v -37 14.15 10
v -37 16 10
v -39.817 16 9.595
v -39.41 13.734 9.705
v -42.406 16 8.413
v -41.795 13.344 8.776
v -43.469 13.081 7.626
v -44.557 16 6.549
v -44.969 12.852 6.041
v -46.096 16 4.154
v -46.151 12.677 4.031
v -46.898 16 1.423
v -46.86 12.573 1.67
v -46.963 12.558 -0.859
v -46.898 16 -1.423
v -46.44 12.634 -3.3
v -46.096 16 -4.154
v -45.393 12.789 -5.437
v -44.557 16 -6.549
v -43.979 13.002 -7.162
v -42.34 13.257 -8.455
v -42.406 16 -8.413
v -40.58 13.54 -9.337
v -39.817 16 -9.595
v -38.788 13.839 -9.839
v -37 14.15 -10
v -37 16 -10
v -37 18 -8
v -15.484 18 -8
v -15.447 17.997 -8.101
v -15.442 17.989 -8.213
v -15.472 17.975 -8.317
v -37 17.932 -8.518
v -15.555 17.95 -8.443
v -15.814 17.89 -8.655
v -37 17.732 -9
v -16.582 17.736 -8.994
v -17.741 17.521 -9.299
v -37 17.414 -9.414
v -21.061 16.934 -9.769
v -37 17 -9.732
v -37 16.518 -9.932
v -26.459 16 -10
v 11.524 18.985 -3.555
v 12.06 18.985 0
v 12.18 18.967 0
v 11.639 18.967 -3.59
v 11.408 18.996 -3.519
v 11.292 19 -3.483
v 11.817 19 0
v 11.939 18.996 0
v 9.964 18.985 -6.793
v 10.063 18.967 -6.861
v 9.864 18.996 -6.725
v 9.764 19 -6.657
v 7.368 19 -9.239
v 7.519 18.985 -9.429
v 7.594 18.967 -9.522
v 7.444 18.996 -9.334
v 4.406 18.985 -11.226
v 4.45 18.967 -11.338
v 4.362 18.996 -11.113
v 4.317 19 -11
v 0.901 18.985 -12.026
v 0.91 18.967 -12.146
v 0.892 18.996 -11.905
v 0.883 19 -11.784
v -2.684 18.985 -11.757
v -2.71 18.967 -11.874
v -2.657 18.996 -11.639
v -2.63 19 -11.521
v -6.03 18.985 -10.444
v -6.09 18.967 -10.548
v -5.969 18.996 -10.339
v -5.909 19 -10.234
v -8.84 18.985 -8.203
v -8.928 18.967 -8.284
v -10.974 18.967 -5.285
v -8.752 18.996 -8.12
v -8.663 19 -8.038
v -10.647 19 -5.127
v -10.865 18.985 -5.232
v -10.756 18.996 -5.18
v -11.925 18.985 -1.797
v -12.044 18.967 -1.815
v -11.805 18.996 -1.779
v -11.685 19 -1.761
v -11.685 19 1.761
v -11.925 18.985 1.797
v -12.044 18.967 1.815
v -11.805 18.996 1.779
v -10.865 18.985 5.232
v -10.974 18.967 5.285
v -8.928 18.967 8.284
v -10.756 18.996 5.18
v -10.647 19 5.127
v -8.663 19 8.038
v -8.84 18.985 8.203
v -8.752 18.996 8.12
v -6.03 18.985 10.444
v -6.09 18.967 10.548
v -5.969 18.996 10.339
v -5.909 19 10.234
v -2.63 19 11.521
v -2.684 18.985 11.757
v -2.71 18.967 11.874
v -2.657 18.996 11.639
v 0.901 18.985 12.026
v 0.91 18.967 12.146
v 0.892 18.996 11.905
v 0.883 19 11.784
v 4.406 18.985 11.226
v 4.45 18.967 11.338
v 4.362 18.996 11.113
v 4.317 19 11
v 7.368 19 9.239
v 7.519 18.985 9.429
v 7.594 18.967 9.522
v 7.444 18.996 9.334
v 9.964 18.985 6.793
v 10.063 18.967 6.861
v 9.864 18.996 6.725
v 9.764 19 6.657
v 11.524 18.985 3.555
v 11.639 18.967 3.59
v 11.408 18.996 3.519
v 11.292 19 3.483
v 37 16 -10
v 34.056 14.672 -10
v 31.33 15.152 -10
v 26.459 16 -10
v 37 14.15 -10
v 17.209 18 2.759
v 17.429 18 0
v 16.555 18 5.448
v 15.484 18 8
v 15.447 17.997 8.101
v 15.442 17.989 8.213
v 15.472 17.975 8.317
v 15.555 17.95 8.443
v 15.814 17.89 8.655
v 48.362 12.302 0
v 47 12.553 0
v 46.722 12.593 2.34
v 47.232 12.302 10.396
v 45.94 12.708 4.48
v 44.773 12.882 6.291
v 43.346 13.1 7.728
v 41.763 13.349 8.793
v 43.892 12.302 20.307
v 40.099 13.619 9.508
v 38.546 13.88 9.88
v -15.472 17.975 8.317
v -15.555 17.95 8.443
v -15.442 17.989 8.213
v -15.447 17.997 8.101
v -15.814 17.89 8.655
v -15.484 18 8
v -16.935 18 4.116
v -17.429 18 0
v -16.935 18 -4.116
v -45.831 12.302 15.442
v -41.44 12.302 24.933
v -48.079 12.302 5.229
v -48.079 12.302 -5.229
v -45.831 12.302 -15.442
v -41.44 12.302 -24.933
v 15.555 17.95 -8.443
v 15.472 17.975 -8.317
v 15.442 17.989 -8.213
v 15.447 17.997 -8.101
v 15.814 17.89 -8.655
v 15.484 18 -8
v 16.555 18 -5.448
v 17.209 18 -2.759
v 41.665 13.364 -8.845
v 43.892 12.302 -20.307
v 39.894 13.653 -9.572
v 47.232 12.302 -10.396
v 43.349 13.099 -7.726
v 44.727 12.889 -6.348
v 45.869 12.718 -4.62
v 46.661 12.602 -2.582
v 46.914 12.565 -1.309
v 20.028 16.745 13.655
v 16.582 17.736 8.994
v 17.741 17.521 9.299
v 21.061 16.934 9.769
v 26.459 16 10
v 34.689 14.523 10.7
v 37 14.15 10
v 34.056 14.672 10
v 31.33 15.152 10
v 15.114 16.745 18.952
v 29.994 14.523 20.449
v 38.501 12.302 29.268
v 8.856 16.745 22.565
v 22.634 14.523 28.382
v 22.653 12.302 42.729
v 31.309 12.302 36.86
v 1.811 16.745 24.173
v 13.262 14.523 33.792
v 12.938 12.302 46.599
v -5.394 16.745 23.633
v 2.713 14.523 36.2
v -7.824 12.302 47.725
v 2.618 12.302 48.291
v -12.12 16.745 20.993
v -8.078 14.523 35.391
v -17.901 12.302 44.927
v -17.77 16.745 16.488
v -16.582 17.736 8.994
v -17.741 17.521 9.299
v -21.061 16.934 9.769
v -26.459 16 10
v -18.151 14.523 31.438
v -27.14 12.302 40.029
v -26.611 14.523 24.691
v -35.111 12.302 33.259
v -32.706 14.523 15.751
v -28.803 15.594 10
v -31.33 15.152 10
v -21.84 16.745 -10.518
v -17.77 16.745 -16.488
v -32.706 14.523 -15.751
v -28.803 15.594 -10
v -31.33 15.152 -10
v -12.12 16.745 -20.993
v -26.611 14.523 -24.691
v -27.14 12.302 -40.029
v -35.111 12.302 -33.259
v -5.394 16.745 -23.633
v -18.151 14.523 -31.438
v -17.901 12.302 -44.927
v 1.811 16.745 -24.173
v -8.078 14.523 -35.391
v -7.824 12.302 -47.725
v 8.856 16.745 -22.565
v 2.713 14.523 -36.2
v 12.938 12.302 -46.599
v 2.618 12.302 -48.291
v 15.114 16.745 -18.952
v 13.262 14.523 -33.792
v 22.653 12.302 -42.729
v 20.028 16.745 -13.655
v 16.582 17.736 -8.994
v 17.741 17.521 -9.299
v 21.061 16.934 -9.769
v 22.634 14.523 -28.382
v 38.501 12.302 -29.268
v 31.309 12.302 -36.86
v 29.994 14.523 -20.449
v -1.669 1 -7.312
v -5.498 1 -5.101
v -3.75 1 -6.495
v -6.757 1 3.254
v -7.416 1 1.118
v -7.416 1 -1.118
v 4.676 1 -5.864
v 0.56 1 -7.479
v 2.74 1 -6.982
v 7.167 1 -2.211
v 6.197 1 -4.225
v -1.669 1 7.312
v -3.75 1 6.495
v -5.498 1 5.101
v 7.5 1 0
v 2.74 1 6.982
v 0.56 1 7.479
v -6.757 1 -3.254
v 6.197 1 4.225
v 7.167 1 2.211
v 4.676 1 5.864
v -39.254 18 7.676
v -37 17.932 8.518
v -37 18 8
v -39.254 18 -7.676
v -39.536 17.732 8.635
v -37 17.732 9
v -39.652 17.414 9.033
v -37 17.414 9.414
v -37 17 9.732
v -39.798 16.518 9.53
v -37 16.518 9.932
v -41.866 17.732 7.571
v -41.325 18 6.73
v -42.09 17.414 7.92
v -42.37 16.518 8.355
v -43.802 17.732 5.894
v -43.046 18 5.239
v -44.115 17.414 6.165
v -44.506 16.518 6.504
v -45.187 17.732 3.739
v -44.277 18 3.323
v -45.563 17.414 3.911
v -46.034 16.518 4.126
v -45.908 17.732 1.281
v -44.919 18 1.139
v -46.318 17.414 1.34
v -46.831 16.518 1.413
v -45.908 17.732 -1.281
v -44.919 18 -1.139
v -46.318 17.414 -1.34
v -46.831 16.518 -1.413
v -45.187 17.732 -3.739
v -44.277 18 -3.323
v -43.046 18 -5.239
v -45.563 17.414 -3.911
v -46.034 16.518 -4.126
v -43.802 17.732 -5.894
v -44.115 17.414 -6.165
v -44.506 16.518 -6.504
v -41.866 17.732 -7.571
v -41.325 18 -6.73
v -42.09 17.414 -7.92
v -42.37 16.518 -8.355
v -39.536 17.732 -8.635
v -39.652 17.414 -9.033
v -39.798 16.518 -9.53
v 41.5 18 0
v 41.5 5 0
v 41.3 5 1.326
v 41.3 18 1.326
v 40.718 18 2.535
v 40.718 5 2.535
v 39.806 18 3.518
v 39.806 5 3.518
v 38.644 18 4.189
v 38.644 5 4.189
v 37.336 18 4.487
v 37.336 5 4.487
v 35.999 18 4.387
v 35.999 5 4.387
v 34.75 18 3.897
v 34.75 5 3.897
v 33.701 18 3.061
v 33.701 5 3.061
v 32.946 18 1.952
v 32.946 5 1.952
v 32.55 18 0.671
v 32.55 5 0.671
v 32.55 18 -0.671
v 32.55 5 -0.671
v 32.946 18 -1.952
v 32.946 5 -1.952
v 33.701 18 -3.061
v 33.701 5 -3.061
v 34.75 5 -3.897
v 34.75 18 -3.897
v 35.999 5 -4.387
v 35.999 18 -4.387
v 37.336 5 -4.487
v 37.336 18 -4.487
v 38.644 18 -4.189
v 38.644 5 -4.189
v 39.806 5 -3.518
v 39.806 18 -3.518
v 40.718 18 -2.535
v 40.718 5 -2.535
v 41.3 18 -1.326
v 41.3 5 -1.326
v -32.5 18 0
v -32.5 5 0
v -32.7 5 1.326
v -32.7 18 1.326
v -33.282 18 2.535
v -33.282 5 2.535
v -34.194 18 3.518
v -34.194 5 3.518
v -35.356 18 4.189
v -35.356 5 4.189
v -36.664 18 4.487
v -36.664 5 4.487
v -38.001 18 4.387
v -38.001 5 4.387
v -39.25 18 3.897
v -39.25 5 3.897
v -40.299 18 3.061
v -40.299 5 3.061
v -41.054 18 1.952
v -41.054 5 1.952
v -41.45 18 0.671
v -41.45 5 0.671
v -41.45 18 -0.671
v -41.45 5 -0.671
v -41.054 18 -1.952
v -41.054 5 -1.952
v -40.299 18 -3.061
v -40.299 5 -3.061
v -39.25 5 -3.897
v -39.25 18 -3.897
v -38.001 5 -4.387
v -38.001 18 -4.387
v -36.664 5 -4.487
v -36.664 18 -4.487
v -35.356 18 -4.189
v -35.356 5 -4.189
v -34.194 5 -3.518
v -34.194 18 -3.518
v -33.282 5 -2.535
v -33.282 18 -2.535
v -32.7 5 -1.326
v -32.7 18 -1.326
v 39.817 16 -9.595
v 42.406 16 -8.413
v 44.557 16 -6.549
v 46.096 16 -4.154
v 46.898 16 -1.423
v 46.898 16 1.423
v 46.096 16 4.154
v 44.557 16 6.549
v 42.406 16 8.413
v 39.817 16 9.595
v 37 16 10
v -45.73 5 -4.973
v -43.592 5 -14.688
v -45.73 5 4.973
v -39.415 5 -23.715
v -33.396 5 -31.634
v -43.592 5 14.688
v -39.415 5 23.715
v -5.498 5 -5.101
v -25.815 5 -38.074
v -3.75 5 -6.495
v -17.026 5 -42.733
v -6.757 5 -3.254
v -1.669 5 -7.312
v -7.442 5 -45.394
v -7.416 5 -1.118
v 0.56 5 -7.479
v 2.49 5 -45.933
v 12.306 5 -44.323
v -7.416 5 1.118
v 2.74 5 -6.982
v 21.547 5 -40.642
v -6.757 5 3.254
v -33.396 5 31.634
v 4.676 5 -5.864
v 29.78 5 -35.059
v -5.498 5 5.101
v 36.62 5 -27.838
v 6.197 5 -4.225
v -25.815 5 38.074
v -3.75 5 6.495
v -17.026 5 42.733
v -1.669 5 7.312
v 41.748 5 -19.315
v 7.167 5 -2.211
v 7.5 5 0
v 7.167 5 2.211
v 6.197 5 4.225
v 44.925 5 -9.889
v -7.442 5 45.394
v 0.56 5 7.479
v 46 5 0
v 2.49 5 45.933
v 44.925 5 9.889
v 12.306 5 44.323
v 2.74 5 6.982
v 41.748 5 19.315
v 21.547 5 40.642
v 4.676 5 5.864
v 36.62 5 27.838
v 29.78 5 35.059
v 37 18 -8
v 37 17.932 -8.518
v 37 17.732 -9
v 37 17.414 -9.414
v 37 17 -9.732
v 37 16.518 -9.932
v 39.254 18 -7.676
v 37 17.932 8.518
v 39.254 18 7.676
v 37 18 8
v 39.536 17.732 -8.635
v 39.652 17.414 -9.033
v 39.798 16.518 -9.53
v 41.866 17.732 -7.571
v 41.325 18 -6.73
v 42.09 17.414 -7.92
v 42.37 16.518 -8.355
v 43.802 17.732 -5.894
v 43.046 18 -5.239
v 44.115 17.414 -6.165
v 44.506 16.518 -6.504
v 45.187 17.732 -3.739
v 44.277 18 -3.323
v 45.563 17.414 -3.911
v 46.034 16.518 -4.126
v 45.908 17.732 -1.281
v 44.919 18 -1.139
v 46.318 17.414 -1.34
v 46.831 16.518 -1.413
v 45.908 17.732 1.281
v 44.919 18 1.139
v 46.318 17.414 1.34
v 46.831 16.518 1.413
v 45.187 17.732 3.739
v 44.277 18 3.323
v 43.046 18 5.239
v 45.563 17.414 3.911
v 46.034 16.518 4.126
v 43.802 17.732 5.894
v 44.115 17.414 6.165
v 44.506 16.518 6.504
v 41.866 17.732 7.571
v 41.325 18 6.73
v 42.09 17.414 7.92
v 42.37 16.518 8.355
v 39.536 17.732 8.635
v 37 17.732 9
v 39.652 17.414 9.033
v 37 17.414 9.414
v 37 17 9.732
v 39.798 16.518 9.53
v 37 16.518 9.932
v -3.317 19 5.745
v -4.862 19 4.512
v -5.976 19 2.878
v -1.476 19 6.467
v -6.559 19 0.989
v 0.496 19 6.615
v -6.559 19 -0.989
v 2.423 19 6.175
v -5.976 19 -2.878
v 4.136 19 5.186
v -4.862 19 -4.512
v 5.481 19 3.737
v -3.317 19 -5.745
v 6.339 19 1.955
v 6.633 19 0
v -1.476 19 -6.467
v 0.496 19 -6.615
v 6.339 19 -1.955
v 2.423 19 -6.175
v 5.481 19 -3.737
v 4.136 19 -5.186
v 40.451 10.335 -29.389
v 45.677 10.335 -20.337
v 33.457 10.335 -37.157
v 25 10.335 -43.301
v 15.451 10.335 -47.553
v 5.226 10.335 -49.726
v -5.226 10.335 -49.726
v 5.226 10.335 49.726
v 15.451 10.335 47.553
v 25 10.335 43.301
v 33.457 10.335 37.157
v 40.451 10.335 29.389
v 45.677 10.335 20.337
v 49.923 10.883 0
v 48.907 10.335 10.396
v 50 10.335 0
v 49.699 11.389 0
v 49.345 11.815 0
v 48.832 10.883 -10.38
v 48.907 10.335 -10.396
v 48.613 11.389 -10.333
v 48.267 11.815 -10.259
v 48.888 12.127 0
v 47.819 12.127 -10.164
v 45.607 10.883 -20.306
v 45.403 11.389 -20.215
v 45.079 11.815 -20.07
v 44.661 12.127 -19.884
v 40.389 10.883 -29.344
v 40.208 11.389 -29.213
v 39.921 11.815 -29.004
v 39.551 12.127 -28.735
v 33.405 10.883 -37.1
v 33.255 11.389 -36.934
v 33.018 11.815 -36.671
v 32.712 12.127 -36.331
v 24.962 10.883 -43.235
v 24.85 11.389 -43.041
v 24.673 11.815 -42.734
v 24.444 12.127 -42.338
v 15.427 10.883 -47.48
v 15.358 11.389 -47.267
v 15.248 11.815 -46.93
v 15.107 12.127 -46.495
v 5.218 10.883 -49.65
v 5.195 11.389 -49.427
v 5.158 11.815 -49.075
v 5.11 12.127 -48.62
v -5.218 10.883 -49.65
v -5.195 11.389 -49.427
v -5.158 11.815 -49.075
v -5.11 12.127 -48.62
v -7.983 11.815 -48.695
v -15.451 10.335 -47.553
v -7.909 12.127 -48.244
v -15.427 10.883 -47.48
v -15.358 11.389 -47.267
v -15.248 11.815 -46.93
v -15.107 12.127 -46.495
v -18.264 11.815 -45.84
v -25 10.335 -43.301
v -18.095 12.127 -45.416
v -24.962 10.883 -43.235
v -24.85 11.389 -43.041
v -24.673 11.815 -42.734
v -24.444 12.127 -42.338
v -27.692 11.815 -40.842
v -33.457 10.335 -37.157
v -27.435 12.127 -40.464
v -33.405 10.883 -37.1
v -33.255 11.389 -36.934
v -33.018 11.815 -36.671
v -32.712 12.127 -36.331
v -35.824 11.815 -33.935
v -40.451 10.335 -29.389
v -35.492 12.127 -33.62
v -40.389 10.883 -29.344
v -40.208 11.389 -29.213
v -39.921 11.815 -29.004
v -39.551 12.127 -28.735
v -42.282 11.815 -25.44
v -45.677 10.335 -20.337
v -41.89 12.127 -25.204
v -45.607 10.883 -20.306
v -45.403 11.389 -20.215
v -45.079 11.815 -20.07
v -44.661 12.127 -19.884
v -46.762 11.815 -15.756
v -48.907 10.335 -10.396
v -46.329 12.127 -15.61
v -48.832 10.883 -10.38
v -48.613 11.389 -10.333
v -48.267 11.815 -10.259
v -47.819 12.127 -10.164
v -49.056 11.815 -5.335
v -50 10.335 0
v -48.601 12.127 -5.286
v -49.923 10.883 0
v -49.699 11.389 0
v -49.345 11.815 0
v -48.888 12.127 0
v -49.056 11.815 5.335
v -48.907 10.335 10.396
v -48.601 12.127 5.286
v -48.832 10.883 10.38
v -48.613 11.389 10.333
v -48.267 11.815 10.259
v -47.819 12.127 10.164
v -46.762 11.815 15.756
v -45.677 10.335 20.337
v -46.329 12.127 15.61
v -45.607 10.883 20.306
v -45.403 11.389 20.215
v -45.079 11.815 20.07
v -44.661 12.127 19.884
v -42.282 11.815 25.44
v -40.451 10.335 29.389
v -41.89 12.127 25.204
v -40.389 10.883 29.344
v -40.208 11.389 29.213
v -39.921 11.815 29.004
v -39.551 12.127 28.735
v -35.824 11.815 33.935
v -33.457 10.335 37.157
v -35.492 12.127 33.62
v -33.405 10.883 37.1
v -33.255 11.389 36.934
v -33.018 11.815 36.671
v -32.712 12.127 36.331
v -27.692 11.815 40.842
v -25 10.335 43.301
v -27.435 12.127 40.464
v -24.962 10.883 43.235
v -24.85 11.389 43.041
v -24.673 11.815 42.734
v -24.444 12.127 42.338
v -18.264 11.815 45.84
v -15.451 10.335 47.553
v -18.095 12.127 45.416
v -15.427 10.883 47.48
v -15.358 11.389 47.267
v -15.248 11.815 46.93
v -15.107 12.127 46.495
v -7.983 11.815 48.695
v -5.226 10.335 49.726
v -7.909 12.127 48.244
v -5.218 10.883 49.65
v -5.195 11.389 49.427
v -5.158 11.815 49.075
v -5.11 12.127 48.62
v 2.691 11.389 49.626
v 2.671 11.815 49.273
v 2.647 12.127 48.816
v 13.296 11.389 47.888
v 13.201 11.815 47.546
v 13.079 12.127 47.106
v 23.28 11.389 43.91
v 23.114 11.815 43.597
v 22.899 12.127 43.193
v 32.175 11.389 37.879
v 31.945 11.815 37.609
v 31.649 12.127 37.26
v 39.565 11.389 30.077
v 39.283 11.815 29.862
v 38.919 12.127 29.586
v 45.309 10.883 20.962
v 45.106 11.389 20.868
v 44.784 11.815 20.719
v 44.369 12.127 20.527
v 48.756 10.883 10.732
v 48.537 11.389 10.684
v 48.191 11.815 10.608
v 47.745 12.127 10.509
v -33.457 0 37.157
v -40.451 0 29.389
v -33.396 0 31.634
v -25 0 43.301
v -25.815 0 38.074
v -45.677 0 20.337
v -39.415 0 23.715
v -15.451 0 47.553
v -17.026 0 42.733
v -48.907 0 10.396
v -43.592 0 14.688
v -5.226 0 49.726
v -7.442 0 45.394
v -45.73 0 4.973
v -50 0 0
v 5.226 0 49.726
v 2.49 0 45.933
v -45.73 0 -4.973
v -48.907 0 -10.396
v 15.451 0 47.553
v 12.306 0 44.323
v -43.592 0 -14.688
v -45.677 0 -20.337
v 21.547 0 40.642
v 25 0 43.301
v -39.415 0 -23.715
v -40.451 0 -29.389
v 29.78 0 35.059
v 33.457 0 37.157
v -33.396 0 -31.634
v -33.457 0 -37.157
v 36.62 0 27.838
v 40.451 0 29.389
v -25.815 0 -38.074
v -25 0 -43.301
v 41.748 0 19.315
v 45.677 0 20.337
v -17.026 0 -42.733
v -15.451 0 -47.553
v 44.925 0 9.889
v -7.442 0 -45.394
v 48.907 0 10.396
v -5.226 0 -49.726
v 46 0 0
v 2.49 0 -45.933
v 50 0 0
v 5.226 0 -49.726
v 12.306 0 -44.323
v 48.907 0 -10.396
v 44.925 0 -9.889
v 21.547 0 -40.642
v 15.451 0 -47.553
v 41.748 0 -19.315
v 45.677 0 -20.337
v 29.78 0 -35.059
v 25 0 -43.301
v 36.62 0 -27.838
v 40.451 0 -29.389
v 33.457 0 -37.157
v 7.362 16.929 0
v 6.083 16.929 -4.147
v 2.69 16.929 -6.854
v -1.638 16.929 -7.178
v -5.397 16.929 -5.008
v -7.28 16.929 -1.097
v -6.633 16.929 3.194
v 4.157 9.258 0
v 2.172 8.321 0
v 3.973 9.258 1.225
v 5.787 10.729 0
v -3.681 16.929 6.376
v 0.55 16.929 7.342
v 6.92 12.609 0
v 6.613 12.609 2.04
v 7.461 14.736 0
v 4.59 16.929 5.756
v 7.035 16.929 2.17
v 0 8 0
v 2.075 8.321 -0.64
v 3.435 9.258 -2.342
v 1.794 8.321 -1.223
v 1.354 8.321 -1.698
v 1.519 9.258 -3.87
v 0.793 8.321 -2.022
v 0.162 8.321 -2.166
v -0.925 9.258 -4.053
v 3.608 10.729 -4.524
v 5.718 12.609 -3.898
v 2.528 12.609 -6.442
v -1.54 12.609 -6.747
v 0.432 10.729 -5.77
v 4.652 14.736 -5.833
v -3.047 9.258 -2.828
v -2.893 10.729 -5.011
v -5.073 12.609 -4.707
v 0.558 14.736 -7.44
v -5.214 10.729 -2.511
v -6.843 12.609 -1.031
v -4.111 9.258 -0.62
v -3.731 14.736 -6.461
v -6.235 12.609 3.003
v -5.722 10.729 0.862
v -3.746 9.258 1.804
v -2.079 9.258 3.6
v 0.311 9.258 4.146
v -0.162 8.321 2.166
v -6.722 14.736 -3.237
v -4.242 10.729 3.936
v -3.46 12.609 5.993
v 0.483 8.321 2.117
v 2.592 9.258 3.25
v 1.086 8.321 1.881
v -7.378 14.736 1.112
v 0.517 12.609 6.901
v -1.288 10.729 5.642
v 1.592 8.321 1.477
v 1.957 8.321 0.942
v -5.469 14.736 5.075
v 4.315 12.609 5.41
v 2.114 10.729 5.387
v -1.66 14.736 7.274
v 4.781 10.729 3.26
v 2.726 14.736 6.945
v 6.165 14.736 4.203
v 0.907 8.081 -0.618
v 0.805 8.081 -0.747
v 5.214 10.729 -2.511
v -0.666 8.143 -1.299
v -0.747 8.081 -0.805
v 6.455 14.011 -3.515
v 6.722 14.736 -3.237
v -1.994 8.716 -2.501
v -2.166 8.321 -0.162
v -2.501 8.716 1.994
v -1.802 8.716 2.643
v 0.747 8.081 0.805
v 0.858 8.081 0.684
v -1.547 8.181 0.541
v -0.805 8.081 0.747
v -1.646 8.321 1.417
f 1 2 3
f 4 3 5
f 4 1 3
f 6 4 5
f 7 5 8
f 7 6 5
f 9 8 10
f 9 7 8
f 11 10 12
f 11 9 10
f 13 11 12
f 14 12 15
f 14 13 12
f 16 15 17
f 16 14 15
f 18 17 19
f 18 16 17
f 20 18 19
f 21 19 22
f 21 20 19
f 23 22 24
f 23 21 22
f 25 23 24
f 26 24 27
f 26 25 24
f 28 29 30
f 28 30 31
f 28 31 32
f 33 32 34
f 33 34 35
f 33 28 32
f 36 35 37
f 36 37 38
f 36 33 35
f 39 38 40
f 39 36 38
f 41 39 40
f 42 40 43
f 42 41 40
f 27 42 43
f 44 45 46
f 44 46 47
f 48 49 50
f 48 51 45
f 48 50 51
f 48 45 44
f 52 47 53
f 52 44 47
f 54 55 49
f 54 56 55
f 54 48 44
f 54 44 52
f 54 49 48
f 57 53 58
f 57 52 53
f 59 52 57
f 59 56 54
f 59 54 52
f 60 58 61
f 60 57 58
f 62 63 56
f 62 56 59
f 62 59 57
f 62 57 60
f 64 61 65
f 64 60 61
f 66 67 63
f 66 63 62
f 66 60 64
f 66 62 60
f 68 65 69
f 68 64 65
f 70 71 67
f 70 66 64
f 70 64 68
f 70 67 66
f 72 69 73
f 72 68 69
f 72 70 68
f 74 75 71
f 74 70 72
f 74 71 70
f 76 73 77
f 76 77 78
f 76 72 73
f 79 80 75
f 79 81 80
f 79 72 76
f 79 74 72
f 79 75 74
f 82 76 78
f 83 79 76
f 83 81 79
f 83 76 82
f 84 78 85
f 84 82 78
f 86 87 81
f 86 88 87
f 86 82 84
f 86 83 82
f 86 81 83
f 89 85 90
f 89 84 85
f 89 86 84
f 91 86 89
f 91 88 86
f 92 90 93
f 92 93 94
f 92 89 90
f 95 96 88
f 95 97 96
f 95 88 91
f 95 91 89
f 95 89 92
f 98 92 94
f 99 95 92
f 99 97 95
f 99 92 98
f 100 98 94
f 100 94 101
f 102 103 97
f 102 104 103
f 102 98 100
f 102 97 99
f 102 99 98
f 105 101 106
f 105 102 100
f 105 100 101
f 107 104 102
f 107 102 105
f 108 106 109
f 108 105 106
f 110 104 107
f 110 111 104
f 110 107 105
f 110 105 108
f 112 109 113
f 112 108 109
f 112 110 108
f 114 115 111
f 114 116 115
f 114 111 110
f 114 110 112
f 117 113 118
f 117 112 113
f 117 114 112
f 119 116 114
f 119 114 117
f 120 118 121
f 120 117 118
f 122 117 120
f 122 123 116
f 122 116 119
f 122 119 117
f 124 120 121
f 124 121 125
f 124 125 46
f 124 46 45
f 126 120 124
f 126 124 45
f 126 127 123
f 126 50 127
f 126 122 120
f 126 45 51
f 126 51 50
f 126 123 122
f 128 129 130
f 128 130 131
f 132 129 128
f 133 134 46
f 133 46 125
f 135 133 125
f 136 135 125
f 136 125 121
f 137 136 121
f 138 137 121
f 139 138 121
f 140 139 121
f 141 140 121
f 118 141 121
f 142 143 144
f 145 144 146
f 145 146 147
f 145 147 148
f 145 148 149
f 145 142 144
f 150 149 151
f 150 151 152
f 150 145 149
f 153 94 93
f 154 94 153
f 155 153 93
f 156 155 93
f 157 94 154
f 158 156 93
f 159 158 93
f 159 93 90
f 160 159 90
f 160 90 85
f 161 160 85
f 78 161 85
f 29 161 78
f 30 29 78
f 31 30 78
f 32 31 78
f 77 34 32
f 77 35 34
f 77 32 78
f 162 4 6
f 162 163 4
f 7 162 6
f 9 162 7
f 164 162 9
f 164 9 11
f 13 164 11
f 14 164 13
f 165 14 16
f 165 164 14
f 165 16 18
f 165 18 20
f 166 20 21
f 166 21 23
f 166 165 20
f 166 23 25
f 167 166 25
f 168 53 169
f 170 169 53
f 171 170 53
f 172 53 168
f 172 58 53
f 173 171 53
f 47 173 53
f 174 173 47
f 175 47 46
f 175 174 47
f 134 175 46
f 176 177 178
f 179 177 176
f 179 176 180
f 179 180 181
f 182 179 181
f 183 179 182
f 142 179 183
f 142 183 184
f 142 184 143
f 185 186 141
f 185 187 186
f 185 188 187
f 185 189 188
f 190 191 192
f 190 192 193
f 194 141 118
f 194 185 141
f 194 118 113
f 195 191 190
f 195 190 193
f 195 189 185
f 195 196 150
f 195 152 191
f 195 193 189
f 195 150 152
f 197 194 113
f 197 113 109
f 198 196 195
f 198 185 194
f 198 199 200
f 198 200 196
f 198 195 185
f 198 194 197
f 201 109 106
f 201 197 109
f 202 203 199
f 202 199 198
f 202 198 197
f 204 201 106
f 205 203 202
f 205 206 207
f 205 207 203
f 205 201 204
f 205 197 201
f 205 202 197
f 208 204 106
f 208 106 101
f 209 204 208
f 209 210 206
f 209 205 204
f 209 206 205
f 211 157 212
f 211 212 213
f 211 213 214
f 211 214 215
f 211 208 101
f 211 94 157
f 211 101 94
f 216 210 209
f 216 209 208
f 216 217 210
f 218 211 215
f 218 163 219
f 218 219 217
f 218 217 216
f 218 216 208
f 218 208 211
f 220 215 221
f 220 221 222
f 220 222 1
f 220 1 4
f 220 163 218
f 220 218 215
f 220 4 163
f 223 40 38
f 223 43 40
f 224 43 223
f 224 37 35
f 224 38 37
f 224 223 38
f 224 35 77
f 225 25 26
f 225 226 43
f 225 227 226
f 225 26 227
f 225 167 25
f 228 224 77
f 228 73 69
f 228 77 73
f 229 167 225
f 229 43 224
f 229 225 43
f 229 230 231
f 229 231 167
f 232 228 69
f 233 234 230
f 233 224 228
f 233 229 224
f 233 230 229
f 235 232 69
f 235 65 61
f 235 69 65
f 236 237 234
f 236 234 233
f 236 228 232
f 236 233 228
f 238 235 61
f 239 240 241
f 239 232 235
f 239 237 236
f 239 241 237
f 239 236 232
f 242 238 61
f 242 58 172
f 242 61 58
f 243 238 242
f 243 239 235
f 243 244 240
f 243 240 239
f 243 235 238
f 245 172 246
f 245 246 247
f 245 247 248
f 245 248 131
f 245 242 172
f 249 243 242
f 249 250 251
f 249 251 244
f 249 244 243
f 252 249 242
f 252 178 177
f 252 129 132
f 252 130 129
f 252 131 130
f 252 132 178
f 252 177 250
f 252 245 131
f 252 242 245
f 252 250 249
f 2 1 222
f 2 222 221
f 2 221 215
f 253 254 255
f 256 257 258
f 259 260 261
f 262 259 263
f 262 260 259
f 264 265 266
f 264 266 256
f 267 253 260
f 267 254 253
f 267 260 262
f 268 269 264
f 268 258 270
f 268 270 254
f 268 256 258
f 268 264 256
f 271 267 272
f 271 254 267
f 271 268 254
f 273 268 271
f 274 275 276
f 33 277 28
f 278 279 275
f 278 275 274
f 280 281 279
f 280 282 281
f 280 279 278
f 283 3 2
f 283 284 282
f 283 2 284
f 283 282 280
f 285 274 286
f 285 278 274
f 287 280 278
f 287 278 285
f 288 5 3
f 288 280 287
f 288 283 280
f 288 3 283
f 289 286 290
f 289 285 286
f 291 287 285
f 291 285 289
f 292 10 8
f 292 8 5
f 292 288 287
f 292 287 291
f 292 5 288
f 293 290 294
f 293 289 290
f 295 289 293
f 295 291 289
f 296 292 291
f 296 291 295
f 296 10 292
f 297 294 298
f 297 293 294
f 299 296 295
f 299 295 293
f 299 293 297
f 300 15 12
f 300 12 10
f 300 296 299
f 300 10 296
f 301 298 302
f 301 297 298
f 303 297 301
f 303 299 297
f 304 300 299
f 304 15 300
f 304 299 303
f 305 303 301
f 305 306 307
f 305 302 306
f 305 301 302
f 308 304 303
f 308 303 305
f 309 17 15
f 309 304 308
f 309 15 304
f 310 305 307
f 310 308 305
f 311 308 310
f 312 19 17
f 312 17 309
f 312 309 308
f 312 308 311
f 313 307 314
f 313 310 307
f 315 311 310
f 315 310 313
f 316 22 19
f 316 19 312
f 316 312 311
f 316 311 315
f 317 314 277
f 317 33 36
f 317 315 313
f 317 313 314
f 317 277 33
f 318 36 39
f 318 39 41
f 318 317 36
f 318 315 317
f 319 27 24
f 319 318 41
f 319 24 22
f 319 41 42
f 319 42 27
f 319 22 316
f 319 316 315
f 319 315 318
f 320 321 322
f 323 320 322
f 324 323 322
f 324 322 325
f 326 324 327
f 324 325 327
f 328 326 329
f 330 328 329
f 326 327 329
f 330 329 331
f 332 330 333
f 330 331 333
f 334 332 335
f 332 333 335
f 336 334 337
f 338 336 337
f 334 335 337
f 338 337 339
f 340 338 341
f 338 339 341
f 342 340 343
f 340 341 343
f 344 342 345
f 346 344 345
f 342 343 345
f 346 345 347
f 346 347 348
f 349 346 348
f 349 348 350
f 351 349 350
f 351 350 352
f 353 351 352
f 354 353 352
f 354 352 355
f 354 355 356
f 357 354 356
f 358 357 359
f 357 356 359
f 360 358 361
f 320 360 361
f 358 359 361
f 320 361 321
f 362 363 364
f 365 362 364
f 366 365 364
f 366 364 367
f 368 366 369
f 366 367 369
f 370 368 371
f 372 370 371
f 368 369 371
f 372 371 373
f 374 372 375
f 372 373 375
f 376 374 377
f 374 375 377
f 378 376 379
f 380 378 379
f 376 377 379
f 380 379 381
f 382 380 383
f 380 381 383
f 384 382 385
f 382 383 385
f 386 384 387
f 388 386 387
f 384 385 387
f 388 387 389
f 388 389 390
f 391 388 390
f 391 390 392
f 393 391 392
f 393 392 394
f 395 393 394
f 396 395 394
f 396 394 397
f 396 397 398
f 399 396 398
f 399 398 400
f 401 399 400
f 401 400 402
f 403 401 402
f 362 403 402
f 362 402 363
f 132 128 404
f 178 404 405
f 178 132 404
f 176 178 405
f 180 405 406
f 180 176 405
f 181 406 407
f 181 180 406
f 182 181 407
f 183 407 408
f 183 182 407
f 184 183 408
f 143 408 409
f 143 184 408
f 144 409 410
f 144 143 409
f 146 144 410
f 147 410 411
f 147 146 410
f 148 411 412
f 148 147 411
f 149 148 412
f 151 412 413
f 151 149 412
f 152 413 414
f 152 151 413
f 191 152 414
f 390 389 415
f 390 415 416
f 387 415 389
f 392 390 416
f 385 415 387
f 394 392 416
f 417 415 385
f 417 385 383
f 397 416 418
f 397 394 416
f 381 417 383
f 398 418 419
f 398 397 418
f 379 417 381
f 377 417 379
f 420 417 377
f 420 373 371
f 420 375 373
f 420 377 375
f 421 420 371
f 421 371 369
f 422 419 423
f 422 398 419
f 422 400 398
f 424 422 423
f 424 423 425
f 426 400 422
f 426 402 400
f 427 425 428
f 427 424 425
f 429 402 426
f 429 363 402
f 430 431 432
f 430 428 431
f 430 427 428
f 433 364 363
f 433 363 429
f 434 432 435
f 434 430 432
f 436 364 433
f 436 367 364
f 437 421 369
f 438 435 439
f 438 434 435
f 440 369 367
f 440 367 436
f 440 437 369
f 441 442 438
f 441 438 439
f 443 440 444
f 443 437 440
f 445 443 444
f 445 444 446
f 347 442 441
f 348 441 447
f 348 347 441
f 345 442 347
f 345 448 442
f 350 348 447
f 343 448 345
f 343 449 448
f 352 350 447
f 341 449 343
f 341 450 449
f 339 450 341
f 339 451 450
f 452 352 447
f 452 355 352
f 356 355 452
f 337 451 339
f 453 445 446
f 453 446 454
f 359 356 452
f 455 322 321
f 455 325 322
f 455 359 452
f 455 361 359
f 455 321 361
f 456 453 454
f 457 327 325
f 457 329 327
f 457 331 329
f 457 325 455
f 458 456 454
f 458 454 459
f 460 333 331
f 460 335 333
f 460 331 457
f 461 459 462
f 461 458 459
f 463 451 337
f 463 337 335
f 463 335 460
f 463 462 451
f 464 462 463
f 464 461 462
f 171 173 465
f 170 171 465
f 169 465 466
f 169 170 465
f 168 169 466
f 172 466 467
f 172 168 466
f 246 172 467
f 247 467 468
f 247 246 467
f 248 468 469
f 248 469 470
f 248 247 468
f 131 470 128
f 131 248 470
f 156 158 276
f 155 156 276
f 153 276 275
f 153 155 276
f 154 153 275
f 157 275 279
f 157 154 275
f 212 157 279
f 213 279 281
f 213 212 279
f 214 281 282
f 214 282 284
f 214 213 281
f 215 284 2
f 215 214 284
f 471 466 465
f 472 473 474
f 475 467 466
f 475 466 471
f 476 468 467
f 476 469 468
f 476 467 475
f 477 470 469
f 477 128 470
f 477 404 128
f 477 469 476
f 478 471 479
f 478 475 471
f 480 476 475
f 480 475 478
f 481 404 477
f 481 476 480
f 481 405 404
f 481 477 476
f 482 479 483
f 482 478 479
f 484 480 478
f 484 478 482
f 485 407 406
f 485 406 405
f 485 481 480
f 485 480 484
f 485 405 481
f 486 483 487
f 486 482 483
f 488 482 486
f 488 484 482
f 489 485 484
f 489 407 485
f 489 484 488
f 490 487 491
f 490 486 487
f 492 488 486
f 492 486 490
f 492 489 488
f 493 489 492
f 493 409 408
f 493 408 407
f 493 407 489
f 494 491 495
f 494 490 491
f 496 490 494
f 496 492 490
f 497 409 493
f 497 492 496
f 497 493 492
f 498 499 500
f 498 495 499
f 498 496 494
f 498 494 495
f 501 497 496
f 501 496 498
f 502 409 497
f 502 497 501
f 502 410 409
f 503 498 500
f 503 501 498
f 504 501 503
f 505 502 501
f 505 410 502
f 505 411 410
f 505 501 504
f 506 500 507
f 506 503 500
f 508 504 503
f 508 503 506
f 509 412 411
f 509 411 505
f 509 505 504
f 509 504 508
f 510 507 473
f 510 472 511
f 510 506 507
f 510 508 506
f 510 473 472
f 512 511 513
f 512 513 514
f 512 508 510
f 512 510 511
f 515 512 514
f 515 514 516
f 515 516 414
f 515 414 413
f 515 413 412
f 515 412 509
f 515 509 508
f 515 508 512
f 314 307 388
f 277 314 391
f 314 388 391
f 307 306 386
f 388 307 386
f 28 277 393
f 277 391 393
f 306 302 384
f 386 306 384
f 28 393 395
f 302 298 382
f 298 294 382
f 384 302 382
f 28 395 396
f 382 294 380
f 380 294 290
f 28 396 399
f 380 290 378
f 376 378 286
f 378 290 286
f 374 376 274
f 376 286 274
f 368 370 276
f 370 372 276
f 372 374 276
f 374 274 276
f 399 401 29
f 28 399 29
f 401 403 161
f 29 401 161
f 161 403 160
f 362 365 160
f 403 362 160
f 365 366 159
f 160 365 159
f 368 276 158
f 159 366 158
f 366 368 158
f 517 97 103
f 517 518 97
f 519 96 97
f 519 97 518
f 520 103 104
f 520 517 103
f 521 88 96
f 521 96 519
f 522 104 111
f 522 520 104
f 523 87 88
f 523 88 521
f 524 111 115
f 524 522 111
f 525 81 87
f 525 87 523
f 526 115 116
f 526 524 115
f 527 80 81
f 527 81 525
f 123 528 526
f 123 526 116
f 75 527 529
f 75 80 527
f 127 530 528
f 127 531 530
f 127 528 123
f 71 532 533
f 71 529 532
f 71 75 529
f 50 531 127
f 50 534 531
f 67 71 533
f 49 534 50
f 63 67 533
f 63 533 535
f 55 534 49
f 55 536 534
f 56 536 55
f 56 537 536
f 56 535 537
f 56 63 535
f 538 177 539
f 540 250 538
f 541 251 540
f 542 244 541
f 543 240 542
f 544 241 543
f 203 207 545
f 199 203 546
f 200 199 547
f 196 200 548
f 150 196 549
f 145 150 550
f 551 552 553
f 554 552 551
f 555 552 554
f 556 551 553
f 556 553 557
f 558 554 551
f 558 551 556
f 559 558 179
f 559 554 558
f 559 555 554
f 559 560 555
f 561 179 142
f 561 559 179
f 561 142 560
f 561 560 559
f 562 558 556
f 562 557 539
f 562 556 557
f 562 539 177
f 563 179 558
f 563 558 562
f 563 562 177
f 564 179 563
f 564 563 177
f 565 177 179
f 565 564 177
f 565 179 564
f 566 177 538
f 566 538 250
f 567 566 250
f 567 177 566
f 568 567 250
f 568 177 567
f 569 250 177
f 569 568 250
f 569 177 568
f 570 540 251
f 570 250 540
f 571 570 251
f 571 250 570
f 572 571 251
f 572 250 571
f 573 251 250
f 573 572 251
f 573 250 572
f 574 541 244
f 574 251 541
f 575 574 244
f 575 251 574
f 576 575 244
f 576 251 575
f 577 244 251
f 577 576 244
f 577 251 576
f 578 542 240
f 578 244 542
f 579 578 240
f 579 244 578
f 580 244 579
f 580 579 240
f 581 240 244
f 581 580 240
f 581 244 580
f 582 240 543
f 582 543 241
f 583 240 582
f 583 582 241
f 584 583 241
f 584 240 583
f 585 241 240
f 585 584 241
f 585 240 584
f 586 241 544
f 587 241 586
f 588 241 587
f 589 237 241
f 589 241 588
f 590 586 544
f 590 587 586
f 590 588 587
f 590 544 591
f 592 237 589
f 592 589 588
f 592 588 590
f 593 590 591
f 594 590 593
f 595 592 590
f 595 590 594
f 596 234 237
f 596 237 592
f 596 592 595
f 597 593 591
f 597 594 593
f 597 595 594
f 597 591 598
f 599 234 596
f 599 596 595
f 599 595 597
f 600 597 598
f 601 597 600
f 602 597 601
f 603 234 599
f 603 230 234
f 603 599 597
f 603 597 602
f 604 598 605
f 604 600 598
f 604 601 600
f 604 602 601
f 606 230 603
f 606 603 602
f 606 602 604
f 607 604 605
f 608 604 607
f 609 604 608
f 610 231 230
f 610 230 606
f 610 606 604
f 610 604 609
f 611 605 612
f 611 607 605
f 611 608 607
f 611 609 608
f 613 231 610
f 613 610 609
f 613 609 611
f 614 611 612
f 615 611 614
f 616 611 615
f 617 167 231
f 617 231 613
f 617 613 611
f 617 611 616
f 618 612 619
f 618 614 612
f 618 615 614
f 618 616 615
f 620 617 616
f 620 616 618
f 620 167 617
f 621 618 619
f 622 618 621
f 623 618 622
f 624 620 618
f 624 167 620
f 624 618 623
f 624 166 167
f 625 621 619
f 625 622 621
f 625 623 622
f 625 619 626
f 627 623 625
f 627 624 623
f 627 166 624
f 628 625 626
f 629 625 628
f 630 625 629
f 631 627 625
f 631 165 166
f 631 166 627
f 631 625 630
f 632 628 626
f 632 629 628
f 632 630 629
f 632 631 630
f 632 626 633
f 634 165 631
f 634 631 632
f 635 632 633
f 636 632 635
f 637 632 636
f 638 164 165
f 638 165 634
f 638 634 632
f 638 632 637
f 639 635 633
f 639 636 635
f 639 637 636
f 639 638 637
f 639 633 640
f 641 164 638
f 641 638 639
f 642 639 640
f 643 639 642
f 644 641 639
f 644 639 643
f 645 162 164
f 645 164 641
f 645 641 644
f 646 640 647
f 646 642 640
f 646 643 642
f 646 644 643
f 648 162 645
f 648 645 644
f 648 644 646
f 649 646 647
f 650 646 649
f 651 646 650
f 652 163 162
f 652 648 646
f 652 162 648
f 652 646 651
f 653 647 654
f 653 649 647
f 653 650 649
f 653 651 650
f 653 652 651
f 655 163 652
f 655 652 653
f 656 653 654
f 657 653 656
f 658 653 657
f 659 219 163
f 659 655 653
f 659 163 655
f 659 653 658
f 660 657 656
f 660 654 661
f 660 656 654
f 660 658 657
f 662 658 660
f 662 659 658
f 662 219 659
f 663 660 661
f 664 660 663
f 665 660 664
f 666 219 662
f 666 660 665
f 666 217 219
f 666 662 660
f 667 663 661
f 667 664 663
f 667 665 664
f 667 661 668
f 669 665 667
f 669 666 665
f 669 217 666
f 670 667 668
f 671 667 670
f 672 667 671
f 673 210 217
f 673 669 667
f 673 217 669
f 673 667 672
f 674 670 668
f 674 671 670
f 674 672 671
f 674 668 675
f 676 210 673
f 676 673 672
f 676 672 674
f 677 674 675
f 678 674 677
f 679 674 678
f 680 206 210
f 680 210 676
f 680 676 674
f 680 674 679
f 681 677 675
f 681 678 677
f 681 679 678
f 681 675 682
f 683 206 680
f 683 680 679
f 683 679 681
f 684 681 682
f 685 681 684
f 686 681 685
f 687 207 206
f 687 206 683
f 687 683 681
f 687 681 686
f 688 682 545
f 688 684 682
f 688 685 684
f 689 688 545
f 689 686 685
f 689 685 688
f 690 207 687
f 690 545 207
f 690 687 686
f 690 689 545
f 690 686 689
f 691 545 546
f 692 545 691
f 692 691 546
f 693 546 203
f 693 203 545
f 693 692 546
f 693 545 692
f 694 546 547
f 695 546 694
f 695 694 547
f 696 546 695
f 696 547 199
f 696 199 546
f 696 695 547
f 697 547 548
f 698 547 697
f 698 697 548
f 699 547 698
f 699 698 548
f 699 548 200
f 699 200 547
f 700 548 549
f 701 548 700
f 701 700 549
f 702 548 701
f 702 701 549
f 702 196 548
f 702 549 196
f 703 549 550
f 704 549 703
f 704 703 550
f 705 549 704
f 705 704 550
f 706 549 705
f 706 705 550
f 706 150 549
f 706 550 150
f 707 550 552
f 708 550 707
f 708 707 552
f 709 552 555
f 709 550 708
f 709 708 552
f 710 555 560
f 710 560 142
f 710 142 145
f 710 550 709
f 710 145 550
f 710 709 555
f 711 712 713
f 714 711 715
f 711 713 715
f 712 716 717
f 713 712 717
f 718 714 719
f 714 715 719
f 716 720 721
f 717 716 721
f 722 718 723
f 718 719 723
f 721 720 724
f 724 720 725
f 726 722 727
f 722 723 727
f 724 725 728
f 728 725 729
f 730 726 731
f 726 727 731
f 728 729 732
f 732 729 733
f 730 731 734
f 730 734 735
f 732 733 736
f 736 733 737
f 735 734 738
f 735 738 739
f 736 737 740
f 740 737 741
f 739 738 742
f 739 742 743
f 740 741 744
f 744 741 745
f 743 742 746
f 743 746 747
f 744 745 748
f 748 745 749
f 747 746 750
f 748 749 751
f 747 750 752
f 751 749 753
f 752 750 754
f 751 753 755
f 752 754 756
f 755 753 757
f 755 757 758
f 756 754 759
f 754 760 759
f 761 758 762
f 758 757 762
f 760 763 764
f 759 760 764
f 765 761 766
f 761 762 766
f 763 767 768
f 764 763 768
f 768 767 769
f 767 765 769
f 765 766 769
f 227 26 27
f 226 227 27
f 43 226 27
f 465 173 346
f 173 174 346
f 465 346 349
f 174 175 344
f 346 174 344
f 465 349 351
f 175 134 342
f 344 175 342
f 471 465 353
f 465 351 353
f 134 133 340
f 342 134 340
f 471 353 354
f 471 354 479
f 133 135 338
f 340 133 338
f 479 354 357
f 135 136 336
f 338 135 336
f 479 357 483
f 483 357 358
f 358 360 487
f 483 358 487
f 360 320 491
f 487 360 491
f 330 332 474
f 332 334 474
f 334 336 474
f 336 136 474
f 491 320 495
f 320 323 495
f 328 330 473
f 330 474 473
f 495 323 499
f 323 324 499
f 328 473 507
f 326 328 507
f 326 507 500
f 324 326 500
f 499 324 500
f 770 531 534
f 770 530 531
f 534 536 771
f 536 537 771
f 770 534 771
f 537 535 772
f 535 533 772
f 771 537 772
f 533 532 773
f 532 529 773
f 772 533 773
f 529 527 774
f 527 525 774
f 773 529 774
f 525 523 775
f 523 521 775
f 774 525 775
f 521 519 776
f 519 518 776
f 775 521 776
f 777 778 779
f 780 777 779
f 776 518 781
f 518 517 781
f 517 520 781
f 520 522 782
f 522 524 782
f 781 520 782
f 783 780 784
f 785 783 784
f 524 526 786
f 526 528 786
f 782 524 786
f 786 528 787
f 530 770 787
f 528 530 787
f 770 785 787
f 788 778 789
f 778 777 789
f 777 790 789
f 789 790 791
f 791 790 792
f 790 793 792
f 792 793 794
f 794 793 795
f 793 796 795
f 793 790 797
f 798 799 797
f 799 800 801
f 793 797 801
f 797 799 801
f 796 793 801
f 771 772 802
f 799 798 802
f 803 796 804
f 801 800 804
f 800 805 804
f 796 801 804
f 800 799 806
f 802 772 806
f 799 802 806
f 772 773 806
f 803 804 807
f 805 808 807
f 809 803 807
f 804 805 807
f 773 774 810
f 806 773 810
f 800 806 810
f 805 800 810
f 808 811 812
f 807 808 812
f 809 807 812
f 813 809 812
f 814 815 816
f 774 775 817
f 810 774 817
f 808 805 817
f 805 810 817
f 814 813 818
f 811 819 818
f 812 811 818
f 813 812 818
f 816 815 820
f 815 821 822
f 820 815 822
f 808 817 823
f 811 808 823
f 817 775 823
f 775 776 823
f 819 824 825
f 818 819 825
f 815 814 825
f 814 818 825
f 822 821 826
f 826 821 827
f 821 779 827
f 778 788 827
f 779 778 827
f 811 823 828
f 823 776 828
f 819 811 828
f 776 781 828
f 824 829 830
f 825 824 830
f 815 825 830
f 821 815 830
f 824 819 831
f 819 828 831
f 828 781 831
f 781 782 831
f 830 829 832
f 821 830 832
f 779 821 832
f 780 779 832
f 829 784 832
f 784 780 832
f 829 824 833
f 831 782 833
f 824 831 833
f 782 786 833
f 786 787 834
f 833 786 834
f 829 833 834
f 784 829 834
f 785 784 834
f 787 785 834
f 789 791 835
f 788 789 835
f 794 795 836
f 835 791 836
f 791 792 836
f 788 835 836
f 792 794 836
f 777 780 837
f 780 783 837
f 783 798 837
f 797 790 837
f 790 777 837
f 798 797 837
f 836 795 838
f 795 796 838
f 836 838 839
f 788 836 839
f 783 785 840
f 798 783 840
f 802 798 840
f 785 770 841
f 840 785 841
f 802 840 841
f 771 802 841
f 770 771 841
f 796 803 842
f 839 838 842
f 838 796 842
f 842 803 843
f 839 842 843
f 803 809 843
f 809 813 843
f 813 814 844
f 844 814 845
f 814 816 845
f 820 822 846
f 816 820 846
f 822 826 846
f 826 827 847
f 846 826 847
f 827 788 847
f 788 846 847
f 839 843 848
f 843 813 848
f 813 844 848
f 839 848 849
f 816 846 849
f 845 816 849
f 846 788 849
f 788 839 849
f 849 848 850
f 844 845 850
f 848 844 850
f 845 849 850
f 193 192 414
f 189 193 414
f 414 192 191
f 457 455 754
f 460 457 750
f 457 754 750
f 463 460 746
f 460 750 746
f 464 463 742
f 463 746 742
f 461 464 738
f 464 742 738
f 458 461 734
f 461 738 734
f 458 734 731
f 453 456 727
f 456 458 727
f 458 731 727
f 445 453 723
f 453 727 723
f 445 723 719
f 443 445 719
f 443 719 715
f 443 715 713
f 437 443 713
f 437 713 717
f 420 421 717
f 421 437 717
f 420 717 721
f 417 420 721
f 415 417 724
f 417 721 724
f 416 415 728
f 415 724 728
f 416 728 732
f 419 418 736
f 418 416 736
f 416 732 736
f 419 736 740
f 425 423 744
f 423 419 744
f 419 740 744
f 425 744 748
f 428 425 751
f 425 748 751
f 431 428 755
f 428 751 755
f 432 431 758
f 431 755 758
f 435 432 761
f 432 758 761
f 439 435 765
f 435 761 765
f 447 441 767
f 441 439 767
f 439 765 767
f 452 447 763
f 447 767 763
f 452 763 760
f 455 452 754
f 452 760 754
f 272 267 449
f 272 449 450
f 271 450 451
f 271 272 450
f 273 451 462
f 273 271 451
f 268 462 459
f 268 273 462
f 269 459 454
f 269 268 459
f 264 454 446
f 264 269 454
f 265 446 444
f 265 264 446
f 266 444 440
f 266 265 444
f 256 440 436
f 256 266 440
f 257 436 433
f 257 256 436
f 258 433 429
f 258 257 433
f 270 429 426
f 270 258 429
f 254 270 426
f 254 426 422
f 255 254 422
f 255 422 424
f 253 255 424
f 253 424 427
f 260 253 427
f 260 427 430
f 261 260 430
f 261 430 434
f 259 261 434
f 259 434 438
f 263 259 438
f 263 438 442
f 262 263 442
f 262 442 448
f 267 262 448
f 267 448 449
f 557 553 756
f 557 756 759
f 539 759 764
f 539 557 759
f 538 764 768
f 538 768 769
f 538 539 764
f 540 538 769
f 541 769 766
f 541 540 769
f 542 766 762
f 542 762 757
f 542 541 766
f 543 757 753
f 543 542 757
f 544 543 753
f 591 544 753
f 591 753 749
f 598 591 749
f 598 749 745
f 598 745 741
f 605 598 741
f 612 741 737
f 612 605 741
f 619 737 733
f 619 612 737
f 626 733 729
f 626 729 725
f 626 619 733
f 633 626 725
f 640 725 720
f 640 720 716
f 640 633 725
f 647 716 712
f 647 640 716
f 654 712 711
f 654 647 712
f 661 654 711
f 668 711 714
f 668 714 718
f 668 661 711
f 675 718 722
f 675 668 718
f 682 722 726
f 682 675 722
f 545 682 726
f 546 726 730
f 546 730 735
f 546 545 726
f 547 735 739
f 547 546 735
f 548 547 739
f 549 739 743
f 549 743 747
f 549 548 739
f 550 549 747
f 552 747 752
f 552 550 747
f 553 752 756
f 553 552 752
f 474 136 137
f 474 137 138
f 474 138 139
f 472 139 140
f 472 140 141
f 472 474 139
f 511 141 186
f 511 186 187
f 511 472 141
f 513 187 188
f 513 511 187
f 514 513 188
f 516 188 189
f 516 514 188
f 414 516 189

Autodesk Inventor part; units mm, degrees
ref_plane "YZ Plane" through (0, 0, 0) normal (1, 0, 0) x (0, 1, 0)
ref_plane "XZ Plane" through (0, 0, 0) normal (0, 1, 0) x (-1, 0, 0)
ref_plane "XY Plane" through (0, 0, 0) normal (0, 0, 1) x (1, 0, 0)
sketch "Sketch1" plane through (0, 0, 0) normal (0, 0, 1) x (1, 0, 0)
  line L0 (0, 0) -> (50, 0)
  line L1 (50, 0) -> (50, 10.3348)
  line L2 (0, 0) -> (0, 19) construction
  arc A0 (0, 8) -> (6.6332, 19) centre (0, 15.5) ccw
  line L3 (6.6332, 19) -> (11.8173, 19)
  line L4 (48.3623, 12.3017) -> (12.1797, 18.9669)
  arc A1 (12.1797, 18.9669) -> (11.8173, 19) centre (11.8173, 17) ccw
  arc A2 (50, 10.3348) -> (48.3623, 12.3017) centre (48, 10.3348) ccw
  line L5 (0, 0) -> (0, 8)
  point P0 (50, 12)
  point P1 (12, 19)
  dimension "d0" = 50
  dimension "d1" = 12
  dimension "d2" = 19
  dimension "d3" = 15
  dimension "d4" = 3.5
  dimension "d5" = 12
  dimension "d6" = 2
  dimension "d14" = 19
revolve "Revolution1" add sketch "Sketch1" angle 360 about axis through (0, 0, 0) along (0, 1, 0)
sketch "Sketch2" plane through (0, 0, 0) normal (0, -1, 0) x (1, 0, 0)
  circle A0 centre (0, 0) radius 50 projected
  circle A1 centre (0, 0) radius 7.5
  dimension "d8" = 15
extrude "Extrusion1" cut sketch "Sketch2" against normal blind 1 contours A1
sketch "Sketch3" plane through (0, 0, 0) normal (0, -1, 0) x (1, 0, 0)
  circle A0 centre (0, 0) radius 7.5 projected
  circle A1 centre (0, 0) radius 50 projected
  circle A2 centre (0, 0) radius 46
  dimension "d11" = 4
extrude "Extrusion2" cut sketch "Sketch3" against normal blind 5 contours A2
sketch "Sketch4" plane through (0, 5, 0) normal (0, -1, 0) x (1, 0, 0)
  circle A0 centre (0, 0) radius 7.5 projected
  arc A1 (-37, 10) -> (-37, -10) centre (-37, 0) ccw
  arc A2 (37, -10) -> (37, 10) centre (37, 0) ccw
  line L0 (12, 10) -> (12, -10)
  line L1 (-12, 10) -> (-12, -10)
  line L2 (-37, 10) -> (-12, 10)
  line L3 (-37, -10) -> (-12, -10)
  line L4 (12, 10) -> (37, 10)
  line L5 (12, -10) -> (37, -10)
  point P0 (-12, 0)
  point P1 (12, 0)
  dimension "d15" = 20
  dimension "d16" = 20
  dimension "d17" = 74
  dimension "d18" = 37
  dimension "d19" = 20
  dimension "d20" = 20
  dimension "d21" = 25
  dimension "d22" = 25
extrude "Extrusion3" add sketch "Sketch4" against normal blind 13 contours L2 L1 L3 A1 | L5 L0 L4 A2
fillet "Fillet1" radius 2 6 edges at (-25.6371, 18, 10) (-47, 18, 0) (-25.6371, 18, -10) (25.6371, 18, 10) (47, 18, 0) (25.6371, 18, -10)
sketch "Sketch5" plane through (0, 5, 0) normal (0, -1, 0) x (1, 0, 0)
  arc A0 (-37, 10) -> (-37, -10) centre (-37, 0) ccw projected
  circle A1 centre (-37, 0) radius 4.5
  circle A2 centre (37, 0) radius 4.5
  dimension "d26" = 9
  dimension "d27" = 9
extrude "Extrusion4" cut sketch "Sketch5" against normal through all
equation "\"d18\" = 0.5 * d17"
equation "\"d22\" = d21"
equation "\"d27\" = d26"
properties part number "PAD 100mm GRAY PLASTIC WITH ATTACHMENT BORES" material "ABS Plastic"
